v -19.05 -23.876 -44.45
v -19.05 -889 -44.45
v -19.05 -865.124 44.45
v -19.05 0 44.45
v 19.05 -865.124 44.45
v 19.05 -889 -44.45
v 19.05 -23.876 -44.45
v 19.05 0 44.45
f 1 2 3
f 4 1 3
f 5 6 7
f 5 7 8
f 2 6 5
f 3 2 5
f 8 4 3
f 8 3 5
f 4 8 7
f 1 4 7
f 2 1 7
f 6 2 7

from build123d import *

# Parameters (mm, degrees)
F0_W     = 38.1
F0_H     = 88.9
F1_DEPTH = 889
F3_DEPTH = 25.4
F5_DEPTH = 25.4


with BuildPart() as f1:
    # F0 (on Front) → F1 (new body)
    with BuildSketch(Plane.XZ):
        Rectangle(F0_W, F0_H)
    extrude(amount=F1_DEPTH)

    # F2 (on Right) → F3 (cut, symmetric)
    with BuildSketch(Plane.YZ):
        Polygon((-889, -44.45), (-865.124, 44.45), (-889, 44.45), align=None)
    extrude(amount=F3_DEPTH, both=True, mode=Mode.SUBTRACT)

    # F4 (on Right) → F5 (cut, symmetric)
    with BuildSketch(Plane.YZ):
        Polygon((0, -44.45), (0, 44.45), (-23.876, -44.45), align=None)
    extrude(amount=F5_DEPTH, both=True, mode=Mode.SUBTRACT)


solid = f1.part
